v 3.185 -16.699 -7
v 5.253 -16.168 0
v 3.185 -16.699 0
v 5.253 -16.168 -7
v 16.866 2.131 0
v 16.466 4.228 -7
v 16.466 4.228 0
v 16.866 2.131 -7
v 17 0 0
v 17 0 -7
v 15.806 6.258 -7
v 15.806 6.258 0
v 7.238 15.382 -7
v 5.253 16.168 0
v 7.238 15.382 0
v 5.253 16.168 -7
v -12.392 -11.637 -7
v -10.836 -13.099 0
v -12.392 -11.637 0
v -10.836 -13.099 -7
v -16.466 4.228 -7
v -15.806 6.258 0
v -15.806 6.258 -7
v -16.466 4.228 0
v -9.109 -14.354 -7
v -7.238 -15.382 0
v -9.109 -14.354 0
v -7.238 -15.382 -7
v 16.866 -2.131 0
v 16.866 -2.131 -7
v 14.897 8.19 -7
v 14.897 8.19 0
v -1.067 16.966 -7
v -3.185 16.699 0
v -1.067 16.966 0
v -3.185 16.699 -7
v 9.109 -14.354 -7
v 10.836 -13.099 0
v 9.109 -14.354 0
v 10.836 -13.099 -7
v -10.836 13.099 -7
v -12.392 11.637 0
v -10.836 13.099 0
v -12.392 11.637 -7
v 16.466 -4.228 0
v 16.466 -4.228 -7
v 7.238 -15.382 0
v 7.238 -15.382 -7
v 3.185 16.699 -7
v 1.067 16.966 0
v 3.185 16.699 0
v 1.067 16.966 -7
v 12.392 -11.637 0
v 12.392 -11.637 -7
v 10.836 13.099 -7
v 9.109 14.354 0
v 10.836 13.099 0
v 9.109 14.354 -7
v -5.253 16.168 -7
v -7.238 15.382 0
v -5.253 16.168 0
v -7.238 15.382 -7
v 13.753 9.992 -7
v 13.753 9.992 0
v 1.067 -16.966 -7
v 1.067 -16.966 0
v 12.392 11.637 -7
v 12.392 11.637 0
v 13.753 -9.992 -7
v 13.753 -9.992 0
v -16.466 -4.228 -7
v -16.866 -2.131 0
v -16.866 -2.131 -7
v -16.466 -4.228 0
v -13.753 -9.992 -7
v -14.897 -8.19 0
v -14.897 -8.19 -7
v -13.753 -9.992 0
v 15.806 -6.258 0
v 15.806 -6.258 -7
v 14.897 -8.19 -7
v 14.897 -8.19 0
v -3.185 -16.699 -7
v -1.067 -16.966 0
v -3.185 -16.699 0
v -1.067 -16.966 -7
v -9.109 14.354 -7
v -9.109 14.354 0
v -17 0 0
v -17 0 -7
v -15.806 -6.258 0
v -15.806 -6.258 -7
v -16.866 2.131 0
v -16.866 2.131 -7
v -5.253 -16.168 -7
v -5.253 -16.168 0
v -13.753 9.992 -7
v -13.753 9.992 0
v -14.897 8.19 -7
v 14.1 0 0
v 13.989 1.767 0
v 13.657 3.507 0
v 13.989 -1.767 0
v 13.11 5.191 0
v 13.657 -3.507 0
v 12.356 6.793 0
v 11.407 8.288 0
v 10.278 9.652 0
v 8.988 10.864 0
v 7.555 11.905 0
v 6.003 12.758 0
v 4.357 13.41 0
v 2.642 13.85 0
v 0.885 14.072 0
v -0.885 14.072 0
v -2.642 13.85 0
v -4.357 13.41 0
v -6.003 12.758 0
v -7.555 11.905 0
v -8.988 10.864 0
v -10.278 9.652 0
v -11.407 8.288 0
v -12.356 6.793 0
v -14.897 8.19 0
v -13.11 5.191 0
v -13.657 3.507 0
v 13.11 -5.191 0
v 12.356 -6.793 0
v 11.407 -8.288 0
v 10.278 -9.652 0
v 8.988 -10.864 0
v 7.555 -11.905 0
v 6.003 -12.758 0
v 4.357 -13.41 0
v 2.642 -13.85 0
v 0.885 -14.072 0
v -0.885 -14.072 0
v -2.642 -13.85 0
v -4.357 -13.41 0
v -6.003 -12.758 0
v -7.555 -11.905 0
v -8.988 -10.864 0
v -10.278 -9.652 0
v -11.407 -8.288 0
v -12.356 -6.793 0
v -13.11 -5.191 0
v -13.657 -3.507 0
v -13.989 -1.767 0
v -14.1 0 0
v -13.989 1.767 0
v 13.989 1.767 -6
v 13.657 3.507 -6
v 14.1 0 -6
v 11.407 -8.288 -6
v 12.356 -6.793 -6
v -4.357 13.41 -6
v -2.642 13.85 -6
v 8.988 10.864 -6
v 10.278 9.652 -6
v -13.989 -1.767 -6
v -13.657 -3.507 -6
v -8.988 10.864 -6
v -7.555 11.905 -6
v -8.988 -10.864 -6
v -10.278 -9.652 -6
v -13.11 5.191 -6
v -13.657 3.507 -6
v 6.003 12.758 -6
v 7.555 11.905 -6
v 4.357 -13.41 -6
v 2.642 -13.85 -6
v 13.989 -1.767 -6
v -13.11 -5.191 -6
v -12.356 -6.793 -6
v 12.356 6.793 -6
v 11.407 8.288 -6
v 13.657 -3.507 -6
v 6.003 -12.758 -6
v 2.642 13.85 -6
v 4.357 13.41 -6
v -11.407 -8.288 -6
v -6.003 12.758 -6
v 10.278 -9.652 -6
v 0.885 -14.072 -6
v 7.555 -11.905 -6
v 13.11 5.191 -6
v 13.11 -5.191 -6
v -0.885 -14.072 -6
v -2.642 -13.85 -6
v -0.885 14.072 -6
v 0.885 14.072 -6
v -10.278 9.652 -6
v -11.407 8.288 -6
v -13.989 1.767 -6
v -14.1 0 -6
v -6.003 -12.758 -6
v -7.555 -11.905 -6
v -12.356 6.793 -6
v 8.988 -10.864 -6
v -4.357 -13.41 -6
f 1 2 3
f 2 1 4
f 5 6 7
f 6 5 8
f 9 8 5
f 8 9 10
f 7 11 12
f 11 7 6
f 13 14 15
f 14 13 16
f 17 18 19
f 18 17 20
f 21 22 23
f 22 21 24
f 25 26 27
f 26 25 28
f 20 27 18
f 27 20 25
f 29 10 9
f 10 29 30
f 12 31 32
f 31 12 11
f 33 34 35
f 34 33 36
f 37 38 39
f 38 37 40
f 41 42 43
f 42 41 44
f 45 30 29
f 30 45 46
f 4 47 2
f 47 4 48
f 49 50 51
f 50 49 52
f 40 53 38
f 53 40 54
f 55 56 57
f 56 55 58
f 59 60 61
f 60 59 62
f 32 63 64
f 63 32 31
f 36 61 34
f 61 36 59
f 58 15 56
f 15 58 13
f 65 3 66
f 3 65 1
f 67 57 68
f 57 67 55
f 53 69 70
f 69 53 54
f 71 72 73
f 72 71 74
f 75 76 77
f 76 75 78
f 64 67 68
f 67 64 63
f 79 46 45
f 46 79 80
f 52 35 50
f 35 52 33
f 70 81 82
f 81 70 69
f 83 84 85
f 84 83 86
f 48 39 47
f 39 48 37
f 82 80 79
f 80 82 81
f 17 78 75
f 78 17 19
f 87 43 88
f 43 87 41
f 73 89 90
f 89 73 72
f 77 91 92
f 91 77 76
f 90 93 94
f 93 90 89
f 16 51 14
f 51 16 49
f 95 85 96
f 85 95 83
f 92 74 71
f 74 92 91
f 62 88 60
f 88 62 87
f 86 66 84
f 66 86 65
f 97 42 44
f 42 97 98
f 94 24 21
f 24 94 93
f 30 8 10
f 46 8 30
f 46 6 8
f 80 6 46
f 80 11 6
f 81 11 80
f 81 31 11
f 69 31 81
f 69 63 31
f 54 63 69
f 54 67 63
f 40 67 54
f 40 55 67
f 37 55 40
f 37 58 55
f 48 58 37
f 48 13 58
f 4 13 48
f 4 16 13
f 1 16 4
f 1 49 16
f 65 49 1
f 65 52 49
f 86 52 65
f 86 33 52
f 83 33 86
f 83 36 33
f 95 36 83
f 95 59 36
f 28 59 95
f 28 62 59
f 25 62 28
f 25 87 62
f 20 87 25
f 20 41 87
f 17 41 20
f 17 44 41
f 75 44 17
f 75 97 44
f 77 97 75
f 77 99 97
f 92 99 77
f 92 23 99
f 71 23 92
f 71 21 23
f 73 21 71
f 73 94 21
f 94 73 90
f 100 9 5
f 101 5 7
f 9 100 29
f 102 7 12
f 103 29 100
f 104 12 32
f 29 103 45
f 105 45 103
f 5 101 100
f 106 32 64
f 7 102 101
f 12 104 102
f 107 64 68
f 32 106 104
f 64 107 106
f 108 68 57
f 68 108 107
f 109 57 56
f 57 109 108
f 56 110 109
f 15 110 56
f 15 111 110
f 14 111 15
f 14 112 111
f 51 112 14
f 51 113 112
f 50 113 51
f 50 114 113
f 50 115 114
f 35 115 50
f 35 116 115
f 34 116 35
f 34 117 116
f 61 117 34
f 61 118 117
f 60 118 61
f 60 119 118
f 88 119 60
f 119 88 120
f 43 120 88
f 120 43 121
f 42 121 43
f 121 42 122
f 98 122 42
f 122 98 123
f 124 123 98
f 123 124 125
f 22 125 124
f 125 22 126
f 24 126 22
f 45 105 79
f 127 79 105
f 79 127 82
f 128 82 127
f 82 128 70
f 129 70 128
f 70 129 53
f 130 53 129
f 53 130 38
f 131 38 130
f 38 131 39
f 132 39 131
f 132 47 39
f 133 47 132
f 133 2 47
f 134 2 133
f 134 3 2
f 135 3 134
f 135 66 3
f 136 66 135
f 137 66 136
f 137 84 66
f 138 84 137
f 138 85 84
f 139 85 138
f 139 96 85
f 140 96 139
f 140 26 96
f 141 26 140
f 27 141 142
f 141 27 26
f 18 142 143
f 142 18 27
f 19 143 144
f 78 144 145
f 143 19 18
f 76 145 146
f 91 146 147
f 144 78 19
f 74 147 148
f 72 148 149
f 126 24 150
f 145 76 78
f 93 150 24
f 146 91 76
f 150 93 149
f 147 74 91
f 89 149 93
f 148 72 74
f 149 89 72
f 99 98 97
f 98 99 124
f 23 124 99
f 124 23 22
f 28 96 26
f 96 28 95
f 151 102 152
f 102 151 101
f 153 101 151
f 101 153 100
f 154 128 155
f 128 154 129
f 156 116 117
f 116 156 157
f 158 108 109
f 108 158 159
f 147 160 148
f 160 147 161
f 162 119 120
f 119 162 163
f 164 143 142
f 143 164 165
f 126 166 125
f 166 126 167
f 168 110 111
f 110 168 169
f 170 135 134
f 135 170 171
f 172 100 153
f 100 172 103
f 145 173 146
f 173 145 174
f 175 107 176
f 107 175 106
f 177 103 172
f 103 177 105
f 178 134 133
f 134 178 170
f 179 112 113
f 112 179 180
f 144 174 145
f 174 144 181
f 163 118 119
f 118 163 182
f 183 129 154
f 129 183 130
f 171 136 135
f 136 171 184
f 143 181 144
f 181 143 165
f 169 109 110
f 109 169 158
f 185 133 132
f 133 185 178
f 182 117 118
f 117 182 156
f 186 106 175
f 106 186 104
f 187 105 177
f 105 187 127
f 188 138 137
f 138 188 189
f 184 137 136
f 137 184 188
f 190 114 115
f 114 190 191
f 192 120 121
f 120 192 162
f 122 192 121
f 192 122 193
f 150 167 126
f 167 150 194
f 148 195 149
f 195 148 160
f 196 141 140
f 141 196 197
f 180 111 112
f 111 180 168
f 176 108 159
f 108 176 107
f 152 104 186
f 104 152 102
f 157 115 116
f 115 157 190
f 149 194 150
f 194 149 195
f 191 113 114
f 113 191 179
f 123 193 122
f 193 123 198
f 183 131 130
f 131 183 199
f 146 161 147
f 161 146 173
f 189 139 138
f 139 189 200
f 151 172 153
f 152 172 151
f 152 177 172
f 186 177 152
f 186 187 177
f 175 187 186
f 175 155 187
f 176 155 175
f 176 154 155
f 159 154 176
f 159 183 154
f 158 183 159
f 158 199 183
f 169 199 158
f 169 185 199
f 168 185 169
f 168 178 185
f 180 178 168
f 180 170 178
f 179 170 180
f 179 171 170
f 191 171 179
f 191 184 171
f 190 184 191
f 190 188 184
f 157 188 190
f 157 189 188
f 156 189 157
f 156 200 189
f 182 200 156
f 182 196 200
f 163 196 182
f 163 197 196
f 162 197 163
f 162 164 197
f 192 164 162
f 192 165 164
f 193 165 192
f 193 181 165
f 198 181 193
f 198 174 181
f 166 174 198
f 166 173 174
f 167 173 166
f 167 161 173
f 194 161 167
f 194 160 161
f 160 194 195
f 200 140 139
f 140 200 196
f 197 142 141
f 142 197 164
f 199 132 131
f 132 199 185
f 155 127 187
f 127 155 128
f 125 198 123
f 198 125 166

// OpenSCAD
$fn = 50;


difference() {
	union() {
		translate(v = [0, 0, -7.0000000000]) {
			cylinder(h = 7, r = 17.0000000000);
		}
	}
	union() {
		#translate(v = [0, 0, -6.0000000000]) {
			cylinder(h = 6, r = 14.1000000000);
		}
	}
}
